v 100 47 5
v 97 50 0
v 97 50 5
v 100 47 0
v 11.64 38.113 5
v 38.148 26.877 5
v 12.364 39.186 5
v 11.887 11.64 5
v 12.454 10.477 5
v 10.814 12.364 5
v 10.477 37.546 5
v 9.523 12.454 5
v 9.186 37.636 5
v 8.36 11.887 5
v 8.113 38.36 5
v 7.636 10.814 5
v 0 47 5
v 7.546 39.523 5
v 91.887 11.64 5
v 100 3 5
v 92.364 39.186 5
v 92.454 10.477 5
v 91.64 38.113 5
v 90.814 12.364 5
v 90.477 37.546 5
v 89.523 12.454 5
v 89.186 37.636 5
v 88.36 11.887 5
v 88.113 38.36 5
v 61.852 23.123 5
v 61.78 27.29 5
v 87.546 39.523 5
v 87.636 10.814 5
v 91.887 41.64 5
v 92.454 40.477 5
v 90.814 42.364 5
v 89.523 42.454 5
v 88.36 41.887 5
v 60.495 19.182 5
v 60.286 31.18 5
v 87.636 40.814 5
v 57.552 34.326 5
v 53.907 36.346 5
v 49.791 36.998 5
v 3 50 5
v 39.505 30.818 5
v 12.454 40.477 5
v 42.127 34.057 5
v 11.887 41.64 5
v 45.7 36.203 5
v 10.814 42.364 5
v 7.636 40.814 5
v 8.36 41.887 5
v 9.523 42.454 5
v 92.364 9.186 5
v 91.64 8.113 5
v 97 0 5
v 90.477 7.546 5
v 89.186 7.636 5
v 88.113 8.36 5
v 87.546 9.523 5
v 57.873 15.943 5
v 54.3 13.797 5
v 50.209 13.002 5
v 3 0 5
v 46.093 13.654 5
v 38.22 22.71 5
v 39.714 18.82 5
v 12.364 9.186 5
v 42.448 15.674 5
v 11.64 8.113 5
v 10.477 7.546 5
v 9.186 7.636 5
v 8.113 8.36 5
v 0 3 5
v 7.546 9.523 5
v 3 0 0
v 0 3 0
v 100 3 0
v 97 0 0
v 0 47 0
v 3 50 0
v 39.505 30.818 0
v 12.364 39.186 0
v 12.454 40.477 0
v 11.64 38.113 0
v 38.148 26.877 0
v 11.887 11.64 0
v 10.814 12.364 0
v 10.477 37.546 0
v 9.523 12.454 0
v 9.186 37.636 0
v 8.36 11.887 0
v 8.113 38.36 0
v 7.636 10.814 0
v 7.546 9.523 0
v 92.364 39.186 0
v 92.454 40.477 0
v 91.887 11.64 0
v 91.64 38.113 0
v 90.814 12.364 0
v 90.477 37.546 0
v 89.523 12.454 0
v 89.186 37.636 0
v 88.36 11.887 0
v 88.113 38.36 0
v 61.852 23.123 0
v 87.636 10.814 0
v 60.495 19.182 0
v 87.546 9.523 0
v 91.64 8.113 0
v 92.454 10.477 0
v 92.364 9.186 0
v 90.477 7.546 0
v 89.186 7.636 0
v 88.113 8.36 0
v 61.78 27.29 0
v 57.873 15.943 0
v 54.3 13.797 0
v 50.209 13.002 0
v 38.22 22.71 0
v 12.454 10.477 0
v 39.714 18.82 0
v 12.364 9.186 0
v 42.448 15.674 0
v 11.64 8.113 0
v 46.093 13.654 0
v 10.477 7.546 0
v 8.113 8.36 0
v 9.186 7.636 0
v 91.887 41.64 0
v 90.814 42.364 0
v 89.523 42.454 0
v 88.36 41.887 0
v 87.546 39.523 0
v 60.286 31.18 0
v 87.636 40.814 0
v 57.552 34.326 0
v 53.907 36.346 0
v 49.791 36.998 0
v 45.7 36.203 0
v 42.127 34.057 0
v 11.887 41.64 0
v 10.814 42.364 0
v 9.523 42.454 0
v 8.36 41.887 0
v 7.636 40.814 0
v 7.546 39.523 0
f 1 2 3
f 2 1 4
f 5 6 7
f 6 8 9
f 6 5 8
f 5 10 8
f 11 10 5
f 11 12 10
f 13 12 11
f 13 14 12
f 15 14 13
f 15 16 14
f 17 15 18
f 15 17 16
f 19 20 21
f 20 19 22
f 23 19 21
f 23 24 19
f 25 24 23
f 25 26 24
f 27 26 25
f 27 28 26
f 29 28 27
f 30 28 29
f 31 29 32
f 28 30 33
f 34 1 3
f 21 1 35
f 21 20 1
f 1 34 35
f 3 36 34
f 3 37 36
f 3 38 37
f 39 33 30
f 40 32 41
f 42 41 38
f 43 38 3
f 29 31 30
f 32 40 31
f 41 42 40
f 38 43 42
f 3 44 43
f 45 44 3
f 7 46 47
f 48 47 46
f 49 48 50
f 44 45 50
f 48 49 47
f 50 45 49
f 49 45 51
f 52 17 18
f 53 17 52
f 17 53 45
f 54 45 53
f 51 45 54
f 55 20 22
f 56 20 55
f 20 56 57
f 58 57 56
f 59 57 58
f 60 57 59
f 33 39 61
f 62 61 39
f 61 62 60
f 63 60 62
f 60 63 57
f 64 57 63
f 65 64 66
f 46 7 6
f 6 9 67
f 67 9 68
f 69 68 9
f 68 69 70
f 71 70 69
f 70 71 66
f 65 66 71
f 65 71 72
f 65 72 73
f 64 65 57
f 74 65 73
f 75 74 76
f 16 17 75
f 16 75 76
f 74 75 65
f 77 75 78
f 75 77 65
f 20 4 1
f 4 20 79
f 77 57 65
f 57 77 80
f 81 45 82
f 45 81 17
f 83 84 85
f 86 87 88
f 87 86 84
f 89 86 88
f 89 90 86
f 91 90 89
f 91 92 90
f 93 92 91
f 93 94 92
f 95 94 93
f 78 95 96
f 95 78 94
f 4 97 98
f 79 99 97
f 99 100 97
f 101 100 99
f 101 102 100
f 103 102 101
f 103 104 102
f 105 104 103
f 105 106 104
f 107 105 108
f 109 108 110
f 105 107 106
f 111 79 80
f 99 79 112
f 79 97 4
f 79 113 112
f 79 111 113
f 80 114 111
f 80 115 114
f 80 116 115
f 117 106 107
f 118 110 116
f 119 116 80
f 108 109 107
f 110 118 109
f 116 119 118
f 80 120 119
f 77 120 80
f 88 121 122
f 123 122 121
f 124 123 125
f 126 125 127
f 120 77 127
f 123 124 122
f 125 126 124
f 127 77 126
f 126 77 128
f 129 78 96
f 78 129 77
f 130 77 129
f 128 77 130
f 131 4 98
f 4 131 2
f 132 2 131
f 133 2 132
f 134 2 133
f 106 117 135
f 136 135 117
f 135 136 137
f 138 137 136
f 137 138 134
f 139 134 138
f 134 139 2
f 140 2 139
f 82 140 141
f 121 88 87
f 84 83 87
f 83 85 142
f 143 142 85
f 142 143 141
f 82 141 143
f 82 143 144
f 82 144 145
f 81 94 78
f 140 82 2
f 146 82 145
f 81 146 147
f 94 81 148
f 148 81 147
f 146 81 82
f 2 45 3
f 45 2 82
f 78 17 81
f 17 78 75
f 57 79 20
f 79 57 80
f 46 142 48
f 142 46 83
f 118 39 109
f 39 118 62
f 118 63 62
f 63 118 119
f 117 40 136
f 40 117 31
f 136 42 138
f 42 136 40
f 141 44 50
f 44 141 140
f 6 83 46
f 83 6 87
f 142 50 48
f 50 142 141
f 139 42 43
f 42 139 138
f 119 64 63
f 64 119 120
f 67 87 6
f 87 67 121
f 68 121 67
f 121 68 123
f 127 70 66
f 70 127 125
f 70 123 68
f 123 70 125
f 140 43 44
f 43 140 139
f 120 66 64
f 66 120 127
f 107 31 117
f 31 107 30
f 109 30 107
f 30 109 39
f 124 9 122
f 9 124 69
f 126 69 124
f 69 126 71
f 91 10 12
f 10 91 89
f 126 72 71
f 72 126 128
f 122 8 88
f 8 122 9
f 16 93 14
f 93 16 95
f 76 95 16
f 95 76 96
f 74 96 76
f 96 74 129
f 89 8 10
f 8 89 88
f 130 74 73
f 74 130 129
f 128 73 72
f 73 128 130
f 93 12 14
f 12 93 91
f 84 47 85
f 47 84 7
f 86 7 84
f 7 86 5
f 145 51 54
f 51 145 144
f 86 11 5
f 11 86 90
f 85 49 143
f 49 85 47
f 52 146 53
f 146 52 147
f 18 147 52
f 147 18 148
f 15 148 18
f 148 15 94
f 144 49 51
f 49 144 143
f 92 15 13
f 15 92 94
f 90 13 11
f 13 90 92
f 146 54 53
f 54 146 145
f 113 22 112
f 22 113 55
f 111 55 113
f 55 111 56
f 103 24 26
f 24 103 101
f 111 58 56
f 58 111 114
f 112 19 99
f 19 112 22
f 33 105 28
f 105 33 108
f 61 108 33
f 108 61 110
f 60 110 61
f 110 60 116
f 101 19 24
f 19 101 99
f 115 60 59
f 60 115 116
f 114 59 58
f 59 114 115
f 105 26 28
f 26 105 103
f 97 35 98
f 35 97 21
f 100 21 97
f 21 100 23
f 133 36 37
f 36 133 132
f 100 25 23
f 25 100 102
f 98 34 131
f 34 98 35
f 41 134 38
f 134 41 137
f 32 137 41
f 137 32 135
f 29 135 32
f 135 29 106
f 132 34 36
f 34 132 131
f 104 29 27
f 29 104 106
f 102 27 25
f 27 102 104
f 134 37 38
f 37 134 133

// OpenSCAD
$fn = 32;

// ----------------------------------------------------------------------
// Spacer plate: rect 100 x 50
// ----------------------------------------------------------------------

// --- parameters (mm) ---
bore_r = 12;              // centre bore radius
bolt_r = 2.5;             // bolt hole radius
plate_t = 5;              // plate thickness, Z (extrusion height)
plate_l = 100;            // plate length, X
plate_w = 50;             // plate width, Y
inset = 10;               // corner hole inset

profile = [[3, 0], [97, 0], [100, 3], [100, 47], [97, 50], [3, 50], [0, 47], [0, 3]];  // primary outline, 8 points, counter clockwise
void_1 = [[61.78, 27.29], [60.286, 31.18], [57.552, 34.326], [53.907, 36.346], [49.791, 36.998], [45.7, 36.203], [42.127, 34.057], [39.505, 30.818], [38.148, 26.877], [38.22, 22.71], [39.714, 18.82], [42.448, 15.674], [46.093, 13.654], [50.209, 13.002], [54.3, 13.797], [57.873, 15.943], [60.495, 19.182], [61.852, 23.123]];  // centre bore, 18 points
void_2 = [[12.454, 10.477], [11.887, 11.64], [10.814, 12.364], [9.523, 12.454], [8.36, 11.887], [7.636, 10.814], [7.546, 9.523], [8.113, 8.36], [9.186, 7.636], [10.477, 7.546], [11.64, 8.113], [12.364, 9.186]];  // corner hole, 12 points
void_3 = [[12.454, 40.477], [11.887, 41.64], [10.814, 42.364], [9.523, 42.454], [8.36, 41.887], [7.636, 40.814], [7.546, 39.523], [8.113, 38.36], [9.186, 37.636], [10.477, 37.546], [11.64, 38.113], [12.364, 39.186]];  // corner hole, 12 points
void_4 = [[92.454, 10.477], [91.887, 11.64], [90.814, 12.364], [89.523, 12.454], [88.36, 11.887], [87.636, 10.814], [87.546, 9.523], [88.113, 8.36], [89.186, 7.636], [90.477, 7.546], [91.64, 8.113], [92.364, 9.186]];  // corner hole, 12 points
void_5 = [[92.454, 40.477], [91.887, 41.64], [90.814, 42.364], [89.523, 42.454], [88.36, 41.887], [87.636, 40.814], [87.546, 39.523], [88.113, 38.36], [89.186, 37.636], [90.477, 37.546], [91.64, 38.113], [92.364, 39.186]];  // corner hole, 12 points

// --- the one profile operation ---
difference() {
  linear_extrude(height = plate_t) polygon(points = profile);
  translate([0, 0, -1])
    linear_extrude(height = plate_t + 2) polygon(points = void_1);
  translate([0, 0, -1])
    linear_extrude(height = plate_t + 2) polygon(points = void_2);
  translate([0, 0, -1])
    linear_extrude(height = plate_t + 2) polygon(points = void_3);
  translate([0, 0, -1])
    linear_extrude(height = plate_t + 2) polygon(points = void_4);
  translate([0, 0, -1])
    linear_extrude(height = plate_t + 2) polygon(points = void_5);
}
